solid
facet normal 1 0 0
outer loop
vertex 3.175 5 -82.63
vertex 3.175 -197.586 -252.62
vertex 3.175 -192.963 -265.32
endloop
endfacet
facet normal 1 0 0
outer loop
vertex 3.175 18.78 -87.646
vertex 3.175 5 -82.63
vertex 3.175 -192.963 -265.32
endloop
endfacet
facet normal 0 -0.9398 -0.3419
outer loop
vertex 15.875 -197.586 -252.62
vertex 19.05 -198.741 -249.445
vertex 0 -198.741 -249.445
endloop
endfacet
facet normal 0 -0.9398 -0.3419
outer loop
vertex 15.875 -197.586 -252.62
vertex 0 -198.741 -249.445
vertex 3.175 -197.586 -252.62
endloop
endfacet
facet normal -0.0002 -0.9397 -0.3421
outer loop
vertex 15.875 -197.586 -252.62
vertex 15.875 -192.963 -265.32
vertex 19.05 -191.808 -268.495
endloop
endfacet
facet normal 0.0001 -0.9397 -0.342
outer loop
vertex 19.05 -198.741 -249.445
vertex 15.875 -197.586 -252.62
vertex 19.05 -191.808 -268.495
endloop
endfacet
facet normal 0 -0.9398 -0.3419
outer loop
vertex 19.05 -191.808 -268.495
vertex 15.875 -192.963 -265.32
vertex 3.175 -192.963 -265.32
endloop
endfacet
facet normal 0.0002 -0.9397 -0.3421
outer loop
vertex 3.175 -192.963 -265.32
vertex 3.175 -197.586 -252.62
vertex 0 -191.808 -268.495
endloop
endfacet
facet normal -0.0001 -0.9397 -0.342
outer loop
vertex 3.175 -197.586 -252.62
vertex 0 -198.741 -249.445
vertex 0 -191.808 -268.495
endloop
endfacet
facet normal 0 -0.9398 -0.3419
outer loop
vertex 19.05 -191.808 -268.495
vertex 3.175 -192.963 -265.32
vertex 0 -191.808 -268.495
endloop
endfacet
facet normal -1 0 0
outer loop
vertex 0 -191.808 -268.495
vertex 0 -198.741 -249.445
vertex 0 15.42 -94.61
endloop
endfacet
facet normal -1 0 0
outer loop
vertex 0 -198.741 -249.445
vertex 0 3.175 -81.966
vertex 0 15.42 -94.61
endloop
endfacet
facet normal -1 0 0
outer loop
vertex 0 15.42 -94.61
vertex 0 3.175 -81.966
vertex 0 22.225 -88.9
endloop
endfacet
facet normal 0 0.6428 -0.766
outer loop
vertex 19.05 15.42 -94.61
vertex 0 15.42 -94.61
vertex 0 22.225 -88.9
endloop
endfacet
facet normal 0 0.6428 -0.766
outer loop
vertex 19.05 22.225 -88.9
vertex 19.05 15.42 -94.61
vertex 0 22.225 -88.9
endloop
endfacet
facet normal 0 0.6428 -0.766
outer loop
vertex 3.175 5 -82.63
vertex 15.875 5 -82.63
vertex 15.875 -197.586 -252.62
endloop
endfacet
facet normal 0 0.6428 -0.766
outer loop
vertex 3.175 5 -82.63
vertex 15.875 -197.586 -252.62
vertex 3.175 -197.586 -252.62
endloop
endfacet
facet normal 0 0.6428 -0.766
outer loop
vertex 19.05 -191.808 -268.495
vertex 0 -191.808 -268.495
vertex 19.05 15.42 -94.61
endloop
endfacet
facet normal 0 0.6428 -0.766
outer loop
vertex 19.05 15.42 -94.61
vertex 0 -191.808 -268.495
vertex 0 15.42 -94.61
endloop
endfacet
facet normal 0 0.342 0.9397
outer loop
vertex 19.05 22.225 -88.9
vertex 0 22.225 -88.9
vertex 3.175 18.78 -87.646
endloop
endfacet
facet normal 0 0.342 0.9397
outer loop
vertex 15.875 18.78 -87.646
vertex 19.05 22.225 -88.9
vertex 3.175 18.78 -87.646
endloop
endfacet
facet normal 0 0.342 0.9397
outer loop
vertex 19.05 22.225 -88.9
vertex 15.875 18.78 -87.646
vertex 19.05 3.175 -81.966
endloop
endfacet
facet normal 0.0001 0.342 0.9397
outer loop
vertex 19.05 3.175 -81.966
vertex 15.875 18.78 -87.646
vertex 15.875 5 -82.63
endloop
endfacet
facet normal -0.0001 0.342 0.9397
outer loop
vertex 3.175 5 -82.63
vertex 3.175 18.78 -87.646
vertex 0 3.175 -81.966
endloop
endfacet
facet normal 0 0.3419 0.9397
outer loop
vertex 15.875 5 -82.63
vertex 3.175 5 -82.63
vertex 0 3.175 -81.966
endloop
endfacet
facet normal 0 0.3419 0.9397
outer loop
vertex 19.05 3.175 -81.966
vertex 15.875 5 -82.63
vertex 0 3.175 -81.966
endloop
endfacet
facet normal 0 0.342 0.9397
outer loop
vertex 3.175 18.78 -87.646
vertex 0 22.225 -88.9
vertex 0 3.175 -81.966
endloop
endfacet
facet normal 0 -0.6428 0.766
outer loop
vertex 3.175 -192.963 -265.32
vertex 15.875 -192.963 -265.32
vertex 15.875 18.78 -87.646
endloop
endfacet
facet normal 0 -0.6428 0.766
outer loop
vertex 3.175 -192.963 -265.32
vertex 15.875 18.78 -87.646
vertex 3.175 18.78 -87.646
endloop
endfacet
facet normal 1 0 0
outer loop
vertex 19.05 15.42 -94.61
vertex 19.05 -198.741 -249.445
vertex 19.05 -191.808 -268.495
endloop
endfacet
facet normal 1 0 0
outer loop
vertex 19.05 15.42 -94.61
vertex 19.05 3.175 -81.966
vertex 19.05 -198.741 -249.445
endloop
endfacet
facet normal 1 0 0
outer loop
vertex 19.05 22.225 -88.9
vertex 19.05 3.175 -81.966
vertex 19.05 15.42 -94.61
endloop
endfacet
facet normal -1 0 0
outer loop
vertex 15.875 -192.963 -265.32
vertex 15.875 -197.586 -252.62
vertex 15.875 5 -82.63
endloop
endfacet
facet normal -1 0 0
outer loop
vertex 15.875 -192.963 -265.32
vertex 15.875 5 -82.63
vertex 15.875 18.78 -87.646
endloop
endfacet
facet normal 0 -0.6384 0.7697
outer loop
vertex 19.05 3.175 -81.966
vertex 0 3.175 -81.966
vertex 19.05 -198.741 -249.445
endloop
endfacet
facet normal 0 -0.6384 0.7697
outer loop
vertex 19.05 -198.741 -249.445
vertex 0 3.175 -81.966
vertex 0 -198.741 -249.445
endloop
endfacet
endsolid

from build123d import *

# Parameters (mm, degrees)
BOSS_EXTRUDE1_DEPTH     = 19.05
CUT_EXTRUDE1_DEPTH      = 295.751251025
CUT_EXTRUDE1_DEPTH_BACK = 295.751251025
SKETCH2_W               = 12.7
SKETCH2_H               = 12.7


with BuildPart() as part:
    # Sketch1 → Boss-Extrude1 (new body)
    with BuildSketch(Plane(origin=(0, 0, 0), x_dir=(0, 0, -1), z_dir=(1, 0, 0))):
        Polygon((249.444858146, -198.74145037), (268.494858146, -191.807817407), (94.609985754, 15.420103965), (88.9, 22.225), (81.966367037, 3.175), align=None)
    extrude(amount=BOSS_EXTRUDE1_DEPTH)

    # Sketch2 → Cut-Extrude1 (cut, two sides: drawn at the far end of the back side and taken through both)
    with BuildSketch(Plane(origin=(0, -244.765356655, -205.382520494), x_dir=(-1, 0, 0), z_dir=(0, -0.766044443118953, -0.6427876096865692)).offset(-CUT_EXTRUDE1_DEPTH_BACK)):
        with Locations((-9.525, 72.862305619)):
            Rectangle(SKETCH2_W, SKETCH2_H)
    extrude(amount=CUT_EXTRUDE1_DEPTH + CUT_EXTRUDE1_DEPTH_BACK, mode=Mode.SUBTRACT)


solid = part.part
